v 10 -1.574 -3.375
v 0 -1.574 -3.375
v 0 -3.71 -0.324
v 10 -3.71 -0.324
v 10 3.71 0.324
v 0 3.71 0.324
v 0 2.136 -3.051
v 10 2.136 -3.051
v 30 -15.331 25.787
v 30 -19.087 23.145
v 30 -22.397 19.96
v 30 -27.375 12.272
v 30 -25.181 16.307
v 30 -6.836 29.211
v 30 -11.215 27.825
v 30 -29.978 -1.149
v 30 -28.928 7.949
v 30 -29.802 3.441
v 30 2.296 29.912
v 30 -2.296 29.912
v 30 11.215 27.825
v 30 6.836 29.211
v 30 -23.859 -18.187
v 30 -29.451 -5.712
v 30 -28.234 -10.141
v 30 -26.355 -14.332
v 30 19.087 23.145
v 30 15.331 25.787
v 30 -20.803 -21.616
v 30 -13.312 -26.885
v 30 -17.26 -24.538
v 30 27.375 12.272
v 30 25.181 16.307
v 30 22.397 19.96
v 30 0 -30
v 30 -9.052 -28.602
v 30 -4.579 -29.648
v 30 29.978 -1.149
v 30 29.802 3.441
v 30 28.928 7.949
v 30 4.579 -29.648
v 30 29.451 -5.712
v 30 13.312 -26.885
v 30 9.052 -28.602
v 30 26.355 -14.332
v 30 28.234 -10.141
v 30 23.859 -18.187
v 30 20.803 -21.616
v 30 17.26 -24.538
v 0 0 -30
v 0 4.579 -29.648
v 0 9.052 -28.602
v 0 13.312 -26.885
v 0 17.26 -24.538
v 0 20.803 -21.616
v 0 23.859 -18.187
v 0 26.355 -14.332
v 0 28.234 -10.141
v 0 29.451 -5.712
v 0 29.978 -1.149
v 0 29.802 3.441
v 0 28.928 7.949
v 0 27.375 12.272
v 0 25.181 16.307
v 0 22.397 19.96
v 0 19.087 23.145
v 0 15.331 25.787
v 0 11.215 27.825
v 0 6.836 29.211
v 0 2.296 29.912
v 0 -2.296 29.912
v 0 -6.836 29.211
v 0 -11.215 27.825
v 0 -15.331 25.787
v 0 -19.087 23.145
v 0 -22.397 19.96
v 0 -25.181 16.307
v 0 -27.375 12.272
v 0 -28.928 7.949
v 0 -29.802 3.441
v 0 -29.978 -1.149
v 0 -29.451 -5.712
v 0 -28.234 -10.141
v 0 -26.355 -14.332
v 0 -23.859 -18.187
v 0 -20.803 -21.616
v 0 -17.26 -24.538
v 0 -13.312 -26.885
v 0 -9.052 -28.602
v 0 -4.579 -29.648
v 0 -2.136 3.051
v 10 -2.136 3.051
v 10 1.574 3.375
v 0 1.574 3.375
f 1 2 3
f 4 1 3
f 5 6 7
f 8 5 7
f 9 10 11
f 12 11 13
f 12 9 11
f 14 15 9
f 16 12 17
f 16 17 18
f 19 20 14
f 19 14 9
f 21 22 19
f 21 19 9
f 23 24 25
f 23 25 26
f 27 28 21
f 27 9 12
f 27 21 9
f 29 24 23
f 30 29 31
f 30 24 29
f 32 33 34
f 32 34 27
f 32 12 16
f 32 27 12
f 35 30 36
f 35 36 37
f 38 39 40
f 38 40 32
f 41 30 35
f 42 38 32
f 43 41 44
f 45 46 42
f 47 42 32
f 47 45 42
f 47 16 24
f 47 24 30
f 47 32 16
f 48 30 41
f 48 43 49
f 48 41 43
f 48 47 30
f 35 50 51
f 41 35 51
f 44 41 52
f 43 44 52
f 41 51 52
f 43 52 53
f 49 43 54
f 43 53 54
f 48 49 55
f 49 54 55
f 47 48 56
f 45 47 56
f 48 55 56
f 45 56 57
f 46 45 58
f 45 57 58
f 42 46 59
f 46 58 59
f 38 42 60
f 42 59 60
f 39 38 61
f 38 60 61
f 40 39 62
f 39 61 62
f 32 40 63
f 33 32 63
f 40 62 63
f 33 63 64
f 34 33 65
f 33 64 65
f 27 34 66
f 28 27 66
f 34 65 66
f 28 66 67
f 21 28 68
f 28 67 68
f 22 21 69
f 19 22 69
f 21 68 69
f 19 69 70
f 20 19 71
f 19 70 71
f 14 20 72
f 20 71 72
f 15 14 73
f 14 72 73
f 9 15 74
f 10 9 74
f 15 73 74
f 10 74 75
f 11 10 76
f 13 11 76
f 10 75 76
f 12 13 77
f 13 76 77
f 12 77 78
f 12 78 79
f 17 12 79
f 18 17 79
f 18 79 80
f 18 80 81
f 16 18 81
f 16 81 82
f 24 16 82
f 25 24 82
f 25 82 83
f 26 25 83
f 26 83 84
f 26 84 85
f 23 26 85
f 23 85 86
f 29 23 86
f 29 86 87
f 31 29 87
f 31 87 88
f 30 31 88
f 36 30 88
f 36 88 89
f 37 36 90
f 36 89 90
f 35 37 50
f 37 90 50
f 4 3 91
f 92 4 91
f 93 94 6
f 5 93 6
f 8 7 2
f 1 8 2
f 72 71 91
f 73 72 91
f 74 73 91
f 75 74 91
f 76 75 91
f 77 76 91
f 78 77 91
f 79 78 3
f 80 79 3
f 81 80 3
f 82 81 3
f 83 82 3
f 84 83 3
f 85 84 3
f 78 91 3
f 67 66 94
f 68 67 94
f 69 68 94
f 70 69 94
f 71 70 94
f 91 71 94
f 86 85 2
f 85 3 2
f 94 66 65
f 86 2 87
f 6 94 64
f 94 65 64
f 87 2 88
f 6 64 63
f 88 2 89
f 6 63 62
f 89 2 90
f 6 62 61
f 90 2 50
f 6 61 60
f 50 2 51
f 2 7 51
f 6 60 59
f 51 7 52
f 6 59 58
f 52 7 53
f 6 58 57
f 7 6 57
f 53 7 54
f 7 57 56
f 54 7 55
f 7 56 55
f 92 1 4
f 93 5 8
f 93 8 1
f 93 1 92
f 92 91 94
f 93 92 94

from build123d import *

# Parameters (mm, degrees)
SKETCH1_R           = 30
BOSS_EXTRUDE1_DEPTH = 30
CUT_EXTRUDE1_DEPTH  = 10


with BuildPart() as part:
    # Sketch1 → Boss-Extrude1 (new body)
    with BuildSketch(Plane(origin=(0, 0, 0), x_dir=(0, 0, -1), z_dir=(1, 0, 0))):
        Circle(SKETCH1_R)
    extrude(amount=BOSS_EXTRUDE1_DEPTH)

    # Sketch2 → Cut-Extrude1 (cut)
    with BuildSketch(Plane.ZY):
        Polygon((3.050745315, -2.135521721), (3.374788718, 1.574262083), (0.324043403, 3.709783804), (-3.050745315, 2.135521721), (-3.374788718, -1.574262083), (-0.324043403, -3.709783804), align=None)
    extrude(amount=-CUT_EXTRUDE1_DEPTH, mode=Mode.SUBTRACT)


solid = part.part
